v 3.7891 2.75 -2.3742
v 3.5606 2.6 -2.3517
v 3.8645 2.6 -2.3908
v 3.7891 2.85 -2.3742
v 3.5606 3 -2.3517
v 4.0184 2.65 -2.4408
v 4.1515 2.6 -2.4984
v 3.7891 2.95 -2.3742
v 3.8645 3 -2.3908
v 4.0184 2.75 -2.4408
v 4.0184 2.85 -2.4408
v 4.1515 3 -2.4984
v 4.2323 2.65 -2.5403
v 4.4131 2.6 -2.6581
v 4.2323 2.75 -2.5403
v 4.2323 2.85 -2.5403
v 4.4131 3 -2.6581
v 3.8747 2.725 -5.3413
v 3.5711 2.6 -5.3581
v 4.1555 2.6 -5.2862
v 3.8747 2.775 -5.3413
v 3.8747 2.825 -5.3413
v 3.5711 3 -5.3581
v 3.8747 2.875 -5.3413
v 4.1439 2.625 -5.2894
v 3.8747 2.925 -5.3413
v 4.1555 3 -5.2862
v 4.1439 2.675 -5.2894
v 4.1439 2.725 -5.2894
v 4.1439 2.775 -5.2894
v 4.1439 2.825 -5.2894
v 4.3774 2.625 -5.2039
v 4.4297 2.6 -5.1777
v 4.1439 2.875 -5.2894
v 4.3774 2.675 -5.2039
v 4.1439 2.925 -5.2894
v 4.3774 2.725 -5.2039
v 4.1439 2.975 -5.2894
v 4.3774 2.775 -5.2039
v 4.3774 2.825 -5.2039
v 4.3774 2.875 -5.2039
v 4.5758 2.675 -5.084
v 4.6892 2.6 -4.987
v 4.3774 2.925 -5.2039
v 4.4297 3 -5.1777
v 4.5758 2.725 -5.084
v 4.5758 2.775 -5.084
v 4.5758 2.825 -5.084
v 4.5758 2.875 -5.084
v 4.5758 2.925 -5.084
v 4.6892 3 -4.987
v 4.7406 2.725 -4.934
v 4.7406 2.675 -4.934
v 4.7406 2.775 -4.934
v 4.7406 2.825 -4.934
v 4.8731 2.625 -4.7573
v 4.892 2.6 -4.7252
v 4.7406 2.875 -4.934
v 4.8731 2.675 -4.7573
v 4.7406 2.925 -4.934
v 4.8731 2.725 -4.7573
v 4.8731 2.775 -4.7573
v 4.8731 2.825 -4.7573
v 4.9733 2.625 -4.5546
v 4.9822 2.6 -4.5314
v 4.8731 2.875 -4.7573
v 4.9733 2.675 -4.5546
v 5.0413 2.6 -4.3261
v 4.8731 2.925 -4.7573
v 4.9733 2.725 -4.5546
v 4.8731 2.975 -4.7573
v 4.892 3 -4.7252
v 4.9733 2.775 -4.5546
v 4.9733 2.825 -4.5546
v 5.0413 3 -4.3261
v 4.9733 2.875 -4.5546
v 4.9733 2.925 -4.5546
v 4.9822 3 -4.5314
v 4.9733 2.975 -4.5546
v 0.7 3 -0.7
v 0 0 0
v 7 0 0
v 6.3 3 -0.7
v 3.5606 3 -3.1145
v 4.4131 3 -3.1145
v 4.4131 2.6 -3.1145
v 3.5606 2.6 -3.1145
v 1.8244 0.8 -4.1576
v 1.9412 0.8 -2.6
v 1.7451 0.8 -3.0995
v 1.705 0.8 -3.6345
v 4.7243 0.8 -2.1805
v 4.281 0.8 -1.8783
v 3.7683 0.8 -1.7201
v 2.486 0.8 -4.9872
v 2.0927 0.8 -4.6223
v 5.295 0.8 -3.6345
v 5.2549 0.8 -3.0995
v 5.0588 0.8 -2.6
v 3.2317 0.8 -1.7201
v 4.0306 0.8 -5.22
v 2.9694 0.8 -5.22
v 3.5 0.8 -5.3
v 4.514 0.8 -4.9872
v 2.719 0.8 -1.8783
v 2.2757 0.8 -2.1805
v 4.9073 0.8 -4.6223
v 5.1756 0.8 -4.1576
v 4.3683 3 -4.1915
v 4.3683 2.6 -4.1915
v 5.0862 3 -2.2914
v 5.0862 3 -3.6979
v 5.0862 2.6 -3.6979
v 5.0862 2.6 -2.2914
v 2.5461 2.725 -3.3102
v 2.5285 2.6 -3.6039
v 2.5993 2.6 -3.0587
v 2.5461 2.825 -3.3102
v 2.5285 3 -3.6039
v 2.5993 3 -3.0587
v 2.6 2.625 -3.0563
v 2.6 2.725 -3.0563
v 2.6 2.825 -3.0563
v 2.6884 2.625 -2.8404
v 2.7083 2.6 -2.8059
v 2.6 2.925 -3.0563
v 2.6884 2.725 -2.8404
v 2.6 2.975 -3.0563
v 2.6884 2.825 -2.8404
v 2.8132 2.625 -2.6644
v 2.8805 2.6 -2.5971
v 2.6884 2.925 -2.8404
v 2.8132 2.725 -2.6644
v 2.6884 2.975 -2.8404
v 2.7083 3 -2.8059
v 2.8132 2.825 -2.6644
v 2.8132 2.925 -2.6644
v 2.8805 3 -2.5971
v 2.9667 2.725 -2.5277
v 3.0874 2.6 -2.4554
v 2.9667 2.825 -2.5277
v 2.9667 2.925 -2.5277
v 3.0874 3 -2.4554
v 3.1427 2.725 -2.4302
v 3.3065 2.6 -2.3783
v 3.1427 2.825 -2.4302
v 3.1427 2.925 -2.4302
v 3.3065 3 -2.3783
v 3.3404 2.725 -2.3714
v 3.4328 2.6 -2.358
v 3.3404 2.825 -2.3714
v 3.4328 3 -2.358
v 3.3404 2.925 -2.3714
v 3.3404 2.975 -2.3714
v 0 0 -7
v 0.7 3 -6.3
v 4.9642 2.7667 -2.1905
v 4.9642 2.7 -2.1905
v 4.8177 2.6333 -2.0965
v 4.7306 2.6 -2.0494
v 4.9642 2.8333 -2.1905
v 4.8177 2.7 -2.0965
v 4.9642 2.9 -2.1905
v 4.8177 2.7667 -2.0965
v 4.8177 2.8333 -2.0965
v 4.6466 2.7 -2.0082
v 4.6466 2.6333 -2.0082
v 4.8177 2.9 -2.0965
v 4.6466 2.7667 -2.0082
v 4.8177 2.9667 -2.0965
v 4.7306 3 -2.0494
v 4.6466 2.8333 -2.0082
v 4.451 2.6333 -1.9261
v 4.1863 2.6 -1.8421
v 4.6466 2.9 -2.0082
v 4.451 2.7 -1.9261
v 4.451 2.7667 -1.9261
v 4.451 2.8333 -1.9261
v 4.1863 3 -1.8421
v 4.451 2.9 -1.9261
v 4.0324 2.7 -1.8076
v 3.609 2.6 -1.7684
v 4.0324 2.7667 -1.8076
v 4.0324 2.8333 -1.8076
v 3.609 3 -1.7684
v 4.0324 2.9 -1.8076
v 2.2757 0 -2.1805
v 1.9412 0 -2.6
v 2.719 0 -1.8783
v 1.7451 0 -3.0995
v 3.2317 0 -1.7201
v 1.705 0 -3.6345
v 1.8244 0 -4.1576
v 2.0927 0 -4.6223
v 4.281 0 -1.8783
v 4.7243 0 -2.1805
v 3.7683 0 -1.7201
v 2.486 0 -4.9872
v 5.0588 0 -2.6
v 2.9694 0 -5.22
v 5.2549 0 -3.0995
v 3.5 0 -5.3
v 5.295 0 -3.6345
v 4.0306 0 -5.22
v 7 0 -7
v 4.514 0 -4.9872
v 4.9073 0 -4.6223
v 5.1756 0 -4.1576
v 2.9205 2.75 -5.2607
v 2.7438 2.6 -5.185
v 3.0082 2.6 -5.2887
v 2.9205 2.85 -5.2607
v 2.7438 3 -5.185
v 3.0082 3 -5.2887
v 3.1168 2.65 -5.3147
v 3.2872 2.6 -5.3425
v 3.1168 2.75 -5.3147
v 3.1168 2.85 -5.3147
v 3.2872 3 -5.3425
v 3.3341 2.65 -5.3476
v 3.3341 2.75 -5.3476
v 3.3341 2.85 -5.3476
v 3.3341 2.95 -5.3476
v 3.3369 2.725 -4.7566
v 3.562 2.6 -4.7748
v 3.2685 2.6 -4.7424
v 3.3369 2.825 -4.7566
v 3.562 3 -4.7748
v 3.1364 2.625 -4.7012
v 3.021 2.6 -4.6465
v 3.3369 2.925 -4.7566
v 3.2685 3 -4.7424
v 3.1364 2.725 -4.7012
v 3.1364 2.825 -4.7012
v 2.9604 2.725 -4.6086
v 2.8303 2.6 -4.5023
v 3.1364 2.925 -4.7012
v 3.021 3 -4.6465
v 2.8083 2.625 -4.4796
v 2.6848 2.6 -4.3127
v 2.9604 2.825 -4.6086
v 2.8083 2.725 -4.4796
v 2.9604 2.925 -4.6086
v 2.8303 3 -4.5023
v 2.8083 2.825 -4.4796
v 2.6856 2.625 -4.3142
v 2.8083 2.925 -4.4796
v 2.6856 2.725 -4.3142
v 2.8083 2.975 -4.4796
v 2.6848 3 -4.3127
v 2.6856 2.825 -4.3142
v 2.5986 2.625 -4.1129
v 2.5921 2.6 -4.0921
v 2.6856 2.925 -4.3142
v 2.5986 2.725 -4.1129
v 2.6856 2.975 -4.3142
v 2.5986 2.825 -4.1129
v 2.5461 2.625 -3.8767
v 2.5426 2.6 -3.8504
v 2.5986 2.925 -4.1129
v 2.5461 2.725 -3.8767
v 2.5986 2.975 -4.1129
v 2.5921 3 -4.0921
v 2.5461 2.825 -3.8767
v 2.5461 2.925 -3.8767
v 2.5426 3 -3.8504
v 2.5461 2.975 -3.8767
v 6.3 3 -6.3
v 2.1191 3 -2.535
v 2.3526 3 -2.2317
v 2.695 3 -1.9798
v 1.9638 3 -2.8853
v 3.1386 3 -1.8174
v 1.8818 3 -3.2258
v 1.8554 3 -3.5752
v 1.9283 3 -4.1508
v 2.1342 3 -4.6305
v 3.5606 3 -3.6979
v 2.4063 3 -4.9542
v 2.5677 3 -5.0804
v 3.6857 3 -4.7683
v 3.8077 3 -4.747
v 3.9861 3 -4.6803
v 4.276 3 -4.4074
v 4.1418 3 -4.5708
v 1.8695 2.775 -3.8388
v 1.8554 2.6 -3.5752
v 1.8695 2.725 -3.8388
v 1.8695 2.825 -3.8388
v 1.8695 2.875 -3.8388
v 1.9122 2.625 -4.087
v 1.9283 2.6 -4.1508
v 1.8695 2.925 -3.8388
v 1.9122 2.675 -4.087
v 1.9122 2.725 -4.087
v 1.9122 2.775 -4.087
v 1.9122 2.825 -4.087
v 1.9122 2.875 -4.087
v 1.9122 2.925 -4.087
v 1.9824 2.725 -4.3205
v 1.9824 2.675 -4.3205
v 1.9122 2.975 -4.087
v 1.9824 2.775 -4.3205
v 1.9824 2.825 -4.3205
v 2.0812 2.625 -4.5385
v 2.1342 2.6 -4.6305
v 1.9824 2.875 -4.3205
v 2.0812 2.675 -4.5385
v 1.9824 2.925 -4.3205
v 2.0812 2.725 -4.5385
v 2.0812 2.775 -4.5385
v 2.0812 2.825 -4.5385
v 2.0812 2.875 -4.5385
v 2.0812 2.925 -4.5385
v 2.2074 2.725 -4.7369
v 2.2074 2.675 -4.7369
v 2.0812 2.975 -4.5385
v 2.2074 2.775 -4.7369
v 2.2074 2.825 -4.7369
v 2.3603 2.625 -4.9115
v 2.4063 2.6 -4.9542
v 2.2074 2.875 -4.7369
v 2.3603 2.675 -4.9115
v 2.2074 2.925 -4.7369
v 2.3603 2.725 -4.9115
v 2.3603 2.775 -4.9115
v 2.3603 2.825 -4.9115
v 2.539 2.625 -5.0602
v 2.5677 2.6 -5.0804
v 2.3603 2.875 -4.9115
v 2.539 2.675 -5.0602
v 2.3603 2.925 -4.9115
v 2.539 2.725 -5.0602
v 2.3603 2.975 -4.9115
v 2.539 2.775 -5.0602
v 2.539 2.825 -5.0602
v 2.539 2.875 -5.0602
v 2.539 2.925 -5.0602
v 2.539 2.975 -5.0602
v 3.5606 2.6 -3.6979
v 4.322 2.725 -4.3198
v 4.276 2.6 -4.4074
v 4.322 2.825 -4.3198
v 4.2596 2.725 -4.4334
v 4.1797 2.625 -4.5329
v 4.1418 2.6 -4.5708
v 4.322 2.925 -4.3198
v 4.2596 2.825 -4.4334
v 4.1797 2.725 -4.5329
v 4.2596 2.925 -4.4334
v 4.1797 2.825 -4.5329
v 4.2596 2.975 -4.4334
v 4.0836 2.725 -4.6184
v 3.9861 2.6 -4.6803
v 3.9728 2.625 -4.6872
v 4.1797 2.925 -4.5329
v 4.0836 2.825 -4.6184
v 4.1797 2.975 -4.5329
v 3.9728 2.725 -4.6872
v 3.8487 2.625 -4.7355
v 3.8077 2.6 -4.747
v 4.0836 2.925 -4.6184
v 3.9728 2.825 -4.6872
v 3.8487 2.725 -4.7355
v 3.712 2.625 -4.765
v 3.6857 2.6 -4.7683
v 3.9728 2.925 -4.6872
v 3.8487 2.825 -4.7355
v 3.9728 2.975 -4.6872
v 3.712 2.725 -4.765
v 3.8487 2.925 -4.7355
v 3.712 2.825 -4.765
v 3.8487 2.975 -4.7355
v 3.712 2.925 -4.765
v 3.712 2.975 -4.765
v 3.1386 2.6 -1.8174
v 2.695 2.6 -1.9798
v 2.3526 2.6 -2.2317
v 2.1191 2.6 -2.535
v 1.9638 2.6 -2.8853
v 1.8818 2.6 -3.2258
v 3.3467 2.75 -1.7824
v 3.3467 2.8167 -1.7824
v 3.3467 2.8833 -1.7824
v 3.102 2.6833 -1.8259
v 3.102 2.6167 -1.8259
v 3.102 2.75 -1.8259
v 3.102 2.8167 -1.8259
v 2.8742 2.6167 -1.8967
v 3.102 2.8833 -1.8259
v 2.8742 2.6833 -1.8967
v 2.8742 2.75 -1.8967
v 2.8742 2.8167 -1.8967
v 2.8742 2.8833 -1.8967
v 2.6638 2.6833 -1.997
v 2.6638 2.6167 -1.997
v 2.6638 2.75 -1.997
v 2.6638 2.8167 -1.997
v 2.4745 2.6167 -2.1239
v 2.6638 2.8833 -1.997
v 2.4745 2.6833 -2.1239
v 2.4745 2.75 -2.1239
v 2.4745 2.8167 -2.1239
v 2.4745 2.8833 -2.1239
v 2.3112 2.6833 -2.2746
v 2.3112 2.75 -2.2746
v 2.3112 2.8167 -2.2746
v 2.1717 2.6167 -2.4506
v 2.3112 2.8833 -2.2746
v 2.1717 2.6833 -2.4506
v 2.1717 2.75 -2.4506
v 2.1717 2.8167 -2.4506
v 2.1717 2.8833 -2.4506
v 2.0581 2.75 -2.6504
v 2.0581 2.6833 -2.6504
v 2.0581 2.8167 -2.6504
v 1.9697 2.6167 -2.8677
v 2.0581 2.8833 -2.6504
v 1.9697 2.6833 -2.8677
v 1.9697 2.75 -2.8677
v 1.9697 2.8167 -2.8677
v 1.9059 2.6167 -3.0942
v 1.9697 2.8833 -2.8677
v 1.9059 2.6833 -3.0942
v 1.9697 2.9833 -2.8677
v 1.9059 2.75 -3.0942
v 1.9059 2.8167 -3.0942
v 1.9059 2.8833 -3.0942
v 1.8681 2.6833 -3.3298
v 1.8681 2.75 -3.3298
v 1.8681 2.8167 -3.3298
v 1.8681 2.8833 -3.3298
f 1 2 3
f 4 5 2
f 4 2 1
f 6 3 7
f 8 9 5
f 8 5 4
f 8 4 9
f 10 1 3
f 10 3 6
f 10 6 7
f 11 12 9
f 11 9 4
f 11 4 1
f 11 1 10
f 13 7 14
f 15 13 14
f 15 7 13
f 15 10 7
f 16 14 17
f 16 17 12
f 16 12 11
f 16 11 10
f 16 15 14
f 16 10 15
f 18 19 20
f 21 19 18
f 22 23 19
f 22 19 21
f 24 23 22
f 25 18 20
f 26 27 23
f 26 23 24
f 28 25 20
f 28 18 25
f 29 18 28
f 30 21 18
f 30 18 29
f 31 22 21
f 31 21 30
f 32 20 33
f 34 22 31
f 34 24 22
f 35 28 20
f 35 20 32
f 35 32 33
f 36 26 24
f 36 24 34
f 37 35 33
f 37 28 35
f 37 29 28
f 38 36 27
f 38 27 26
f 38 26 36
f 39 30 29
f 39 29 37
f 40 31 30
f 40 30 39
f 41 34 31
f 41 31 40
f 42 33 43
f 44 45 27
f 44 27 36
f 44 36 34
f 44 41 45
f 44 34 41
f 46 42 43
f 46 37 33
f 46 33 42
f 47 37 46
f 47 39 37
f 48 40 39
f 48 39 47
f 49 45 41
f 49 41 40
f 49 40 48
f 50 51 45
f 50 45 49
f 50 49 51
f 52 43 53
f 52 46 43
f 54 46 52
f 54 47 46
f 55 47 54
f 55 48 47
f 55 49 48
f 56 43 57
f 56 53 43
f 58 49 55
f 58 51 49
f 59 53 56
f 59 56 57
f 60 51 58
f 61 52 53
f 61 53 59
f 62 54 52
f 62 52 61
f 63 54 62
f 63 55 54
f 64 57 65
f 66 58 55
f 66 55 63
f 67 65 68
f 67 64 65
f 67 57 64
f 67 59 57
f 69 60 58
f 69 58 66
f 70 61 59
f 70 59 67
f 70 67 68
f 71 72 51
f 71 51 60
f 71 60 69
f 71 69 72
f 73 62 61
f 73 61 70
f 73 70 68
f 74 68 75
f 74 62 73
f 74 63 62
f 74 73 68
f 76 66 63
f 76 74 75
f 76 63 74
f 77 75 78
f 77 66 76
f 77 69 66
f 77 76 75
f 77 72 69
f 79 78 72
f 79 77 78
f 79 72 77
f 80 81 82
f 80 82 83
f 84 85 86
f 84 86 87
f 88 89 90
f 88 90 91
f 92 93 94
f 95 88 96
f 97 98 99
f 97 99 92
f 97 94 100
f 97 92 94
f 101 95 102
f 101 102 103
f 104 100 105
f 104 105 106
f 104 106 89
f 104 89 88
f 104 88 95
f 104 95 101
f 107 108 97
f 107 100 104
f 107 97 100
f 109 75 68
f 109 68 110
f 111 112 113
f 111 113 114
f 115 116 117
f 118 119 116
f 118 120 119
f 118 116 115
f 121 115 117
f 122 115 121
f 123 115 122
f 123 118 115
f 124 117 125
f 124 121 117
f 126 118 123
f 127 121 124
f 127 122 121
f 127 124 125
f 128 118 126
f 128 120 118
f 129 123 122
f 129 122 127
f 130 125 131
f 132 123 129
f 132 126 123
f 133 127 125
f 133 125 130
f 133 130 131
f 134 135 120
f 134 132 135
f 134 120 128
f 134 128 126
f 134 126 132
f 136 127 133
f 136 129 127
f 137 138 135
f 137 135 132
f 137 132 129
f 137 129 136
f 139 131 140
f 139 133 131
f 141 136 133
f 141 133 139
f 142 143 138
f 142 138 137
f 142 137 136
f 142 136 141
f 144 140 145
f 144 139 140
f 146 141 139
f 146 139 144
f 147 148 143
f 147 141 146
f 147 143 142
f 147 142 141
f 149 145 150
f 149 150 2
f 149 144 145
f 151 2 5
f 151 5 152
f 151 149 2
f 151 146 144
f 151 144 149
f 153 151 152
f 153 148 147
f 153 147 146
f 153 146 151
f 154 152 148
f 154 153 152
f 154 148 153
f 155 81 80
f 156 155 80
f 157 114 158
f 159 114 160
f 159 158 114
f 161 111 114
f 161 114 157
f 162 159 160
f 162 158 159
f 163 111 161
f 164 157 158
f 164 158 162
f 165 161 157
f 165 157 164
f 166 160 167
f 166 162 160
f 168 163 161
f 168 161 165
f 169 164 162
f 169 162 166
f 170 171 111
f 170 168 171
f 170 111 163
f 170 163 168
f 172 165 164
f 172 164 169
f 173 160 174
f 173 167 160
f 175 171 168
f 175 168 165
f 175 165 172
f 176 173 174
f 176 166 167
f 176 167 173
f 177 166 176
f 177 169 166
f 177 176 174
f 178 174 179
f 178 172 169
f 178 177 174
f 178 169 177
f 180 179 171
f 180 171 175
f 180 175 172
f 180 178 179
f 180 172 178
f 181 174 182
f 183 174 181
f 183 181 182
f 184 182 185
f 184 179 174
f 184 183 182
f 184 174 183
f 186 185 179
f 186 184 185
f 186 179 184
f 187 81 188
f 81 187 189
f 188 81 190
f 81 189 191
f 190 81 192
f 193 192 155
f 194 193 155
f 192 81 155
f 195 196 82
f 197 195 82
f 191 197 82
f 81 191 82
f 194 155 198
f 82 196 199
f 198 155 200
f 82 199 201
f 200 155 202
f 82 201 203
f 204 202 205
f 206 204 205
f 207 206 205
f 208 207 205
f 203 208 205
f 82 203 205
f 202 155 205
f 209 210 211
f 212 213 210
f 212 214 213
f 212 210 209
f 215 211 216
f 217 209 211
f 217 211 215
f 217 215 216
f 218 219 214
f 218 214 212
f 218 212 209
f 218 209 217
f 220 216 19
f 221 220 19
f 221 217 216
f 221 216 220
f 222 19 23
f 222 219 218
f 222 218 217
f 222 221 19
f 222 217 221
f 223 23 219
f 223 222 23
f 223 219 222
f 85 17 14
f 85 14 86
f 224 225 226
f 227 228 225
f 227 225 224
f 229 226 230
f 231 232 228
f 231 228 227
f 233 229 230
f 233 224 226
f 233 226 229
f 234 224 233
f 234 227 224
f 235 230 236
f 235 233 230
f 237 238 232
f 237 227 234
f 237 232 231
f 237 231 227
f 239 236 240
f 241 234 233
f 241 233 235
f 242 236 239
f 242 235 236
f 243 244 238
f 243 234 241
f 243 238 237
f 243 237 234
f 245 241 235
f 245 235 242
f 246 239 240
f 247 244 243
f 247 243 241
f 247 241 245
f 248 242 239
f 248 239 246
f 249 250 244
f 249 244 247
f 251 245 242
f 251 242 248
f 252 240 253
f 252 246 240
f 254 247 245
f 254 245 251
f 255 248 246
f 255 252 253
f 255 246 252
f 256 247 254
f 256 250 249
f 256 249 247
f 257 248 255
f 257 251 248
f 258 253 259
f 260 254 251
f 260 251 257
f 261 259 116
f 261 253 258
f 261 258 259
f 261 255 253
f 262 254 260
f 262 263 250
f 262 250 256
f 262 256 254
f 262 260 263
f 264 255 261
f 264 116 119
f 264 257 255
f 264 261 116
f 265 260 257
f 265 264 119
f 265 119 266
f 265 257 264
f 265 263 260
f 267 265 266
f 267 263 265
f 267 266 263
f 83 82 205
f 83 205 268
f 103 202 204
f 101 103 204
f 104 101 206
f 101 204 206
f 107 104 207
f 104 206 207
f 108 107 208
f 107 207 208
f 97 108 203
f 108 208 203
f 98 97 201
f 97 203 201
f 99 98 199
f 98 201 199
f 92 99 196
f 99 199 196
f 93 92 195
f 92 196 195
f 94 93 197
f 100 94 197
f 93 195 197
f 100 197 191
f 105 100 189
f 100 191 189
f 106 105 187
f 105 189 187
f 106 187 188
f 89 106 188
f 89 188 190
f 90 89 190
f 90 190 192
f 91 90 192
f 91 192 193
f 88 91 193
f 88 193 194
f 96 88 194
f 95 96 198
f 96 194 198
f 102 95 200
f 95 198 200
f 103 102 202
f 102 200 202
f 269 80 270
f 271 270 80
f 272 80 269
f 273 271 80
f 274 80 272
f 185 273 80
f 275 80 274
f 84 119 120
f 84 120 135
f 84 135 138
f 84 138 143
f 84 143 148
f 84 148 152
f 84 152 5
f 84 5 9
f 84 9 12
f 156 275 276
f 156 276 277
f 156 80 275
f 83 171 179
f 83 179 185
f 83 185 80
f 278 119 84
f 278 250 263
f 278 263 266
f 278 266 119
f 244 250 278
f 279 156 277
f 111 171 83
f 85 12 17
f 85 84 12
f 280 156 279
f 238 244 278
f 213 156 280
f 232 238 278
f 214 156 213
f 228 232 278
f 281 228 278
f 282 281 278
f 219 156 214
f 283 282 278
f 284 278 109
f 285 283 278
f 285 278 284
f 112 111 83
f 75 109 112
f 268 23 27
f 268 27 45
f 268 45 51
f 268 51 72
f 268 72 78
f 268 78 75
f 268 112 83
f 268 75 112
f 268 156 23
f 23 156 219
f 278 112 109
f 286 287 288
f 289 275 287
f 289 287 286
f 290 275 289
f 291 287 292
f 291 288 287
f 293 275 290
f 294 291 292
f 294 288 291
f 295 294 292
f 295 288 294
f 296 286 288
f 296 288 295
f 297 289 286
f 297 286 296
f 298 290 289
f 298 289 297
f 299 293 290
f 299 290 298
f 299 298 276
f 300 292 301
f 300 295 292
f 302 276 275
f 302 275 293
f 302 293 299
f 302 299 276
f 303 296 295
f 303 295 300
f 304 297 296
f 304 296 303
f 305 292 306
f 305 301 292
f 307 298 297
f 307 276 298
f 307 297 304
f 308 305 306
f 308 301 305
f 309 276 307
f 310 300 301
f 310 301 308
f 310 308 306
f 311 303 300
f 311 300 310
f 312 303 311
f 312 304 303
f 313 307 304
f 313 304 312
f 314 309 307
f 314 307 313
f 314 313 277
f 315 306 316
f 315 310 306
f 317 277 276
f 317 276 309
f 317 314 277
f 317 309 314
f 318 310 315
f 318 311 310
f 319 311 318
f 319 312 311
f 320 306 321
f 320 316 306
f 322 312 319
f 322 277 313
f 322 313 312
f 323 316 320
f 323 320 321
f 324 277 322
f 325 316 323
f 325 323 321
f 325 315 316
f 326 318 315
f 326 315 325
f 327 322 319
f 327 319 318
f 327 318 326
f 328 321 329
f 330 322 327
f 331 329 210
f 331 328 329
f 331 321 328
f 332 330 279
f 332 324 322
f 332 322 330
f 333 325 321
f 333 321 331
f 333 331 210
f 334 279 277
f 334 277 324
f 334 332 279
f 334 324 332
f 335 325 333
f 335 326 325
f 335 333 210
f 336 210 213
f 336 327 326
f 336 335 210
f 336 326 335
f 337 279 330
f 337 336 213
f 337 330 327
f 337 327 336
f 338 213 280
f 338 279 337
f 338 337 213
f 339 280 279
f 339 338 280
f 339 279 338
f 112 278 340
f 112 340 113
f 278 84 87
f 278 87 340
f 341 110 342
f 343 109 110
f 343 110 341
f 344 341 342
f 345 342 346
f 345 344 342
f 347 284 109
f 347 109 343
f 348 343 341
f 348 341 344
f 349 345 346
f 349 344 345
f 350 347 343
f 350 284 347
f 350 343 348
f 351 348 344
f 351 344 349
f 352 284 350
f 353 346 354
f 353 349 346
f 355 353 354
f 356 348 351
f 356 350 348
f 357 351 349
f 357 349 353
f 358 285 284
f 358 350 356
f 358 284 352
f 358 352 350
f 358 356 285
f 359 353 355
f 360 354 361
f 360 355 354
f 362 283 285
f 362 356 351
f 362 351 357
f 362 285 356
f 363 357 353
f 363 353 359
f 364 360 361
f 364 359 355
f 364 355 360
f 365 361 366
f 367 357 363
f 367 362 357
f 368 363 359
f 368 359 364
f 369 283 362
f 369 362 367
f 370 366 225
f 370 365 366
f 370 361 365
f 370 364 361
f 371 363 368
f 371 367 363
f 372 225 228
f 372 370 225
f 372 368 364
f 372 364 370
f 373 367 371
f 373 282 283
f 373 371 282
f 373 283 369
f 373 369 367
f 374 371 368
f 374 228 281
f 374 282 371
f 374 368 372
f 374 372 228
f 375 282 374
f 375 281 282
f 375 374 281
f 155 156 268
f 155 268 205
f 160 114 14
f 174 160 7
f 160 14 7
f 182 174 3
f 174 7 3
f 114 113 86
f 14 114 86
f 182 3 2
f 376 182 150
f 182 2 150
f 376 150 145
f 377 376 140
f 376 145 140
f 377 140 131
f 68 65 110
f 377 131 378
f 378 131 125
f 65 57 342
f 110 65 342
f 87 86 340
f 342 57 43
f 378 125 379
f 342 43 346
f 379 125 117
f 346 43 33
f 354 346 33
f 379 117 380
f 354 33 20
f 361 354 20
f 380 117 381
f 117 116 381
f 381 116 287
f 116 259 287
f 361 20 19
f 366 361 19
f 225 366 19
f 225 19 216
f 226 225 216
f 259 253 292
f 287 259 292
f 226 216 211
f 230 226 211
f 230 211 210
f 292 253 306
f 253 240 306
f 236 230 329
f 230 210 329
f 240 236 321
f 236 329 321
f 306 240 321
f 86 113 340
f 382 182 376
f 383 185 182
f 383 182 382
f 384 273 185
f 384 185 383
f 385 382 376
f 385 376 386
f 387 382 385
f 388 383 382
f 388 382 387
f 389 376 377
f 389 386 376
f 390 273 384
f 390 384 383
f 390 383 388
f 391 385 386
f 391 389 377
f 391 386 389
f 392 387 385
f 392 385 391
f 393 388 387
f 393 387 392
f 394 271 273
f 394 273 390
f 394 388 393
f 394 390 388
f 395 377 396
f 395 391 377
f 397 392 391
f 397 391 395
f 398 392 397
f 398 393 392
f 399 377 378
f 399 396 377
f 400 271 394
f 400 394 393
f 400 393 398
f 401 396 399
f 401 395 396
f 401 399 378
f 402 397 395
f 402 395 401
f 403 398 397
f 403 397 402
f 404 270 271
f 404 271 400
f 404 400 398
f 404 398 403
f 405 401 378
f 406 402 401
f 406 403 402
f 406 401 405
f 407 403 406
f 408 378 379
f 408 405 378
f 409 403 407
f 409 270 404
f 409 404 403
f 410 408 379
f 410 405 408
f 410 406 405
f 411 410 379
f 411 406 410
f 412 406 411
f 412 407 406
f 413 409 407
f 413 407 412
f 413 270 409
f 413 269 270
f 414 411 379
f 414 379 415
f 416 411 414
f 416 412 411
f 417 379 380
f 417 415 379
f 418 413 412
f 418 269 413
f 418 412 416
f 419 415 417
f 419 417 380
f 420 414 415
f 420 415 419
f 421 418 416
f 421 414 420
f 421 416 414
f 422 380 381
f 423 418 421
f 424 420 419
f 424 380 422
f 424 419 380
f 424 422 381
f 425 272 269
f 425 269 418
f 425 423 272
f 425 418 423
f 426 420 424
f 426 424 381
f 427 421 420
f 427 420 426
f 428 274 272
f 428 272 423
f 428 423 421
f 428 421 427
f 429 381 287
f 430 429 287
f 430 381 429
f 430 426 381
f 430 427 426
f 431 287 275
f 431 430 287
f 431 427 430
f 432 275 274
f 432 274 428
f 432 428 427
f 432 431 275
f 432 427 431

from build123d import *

# Parameters (mm, degrees)
SKETCH1_W           = 7
SKETCH1_H           = 7
BOSS_EXTRUDE1_DEPTH = 3
CUT_EXTRUDE1_DEPTH  = 7
CUT_EXTRUDE2_DEPTH  = 11
SKETCH4_R           = 1.8
CUT_EXTRUDE3_DEPTH  = 0.8
CUT_EXTRUDE4_DEPTH  = 0.4


with BuildPart() as part:
    # Sketch1 → Boss-Extrude1 (new body)
    with BuildSketch(Plane(origin=(0, 0, 0), x_dir=(1, 0, 0), z_dir=(0, 1, 0))):
        with Locations((3.5, 3.5)):
            Rectangle(SKETCH1_W, SKETCH1_H)
    extrude(amount=BOSS_EXTRUDE1_DEPTH)

    # Sketch2 → Cut-Extrude1 (cut)
    with BuildSketch(Plane.XY):
        Polygon((0, 0), (0.7, 3), (0, 3), align=None)
        Polygon((7, 0), (6.3, 3), (7, 3), align=None)
    extrude(amount=-CUT_EXTRUDE1_DEPTH, mode=Mode.SUBTRACT)

    # Sketch3 → Cut-Extrude2 (cut)
    with BuildSketch(Plane(origin=(0, 0, 0), x_dir=(0, 0, -1), z_dir=(1, 0, 0))):
        Polygon((0, 0), (0.7, 3), (0, 3), align=None)
        Polygon((7, 3), (6.3, 3), (7, 0), align=None)
    extrude(amount=CUT_EXTRUDE2_DEPTH, mode=Mode.SUBTRACT)

    # Sketch4 → Cut-Extrude3 (cut)
    with BuildSketch(Plane.XZ):
        with Locations(Location((3.5, -3.5, 0), (0, 0, 270))):
            Circle(SKETCH4_R)
    extrude(amount=-CUT_EXTRUDE3_DEPTH, mode=Mode.SUBTRACT)

    # Sketch5 → Cut-Extrude4 (cut)
    with BuildSketch(Plane(origin=(0, 3, 0), x_dir=(1, 0, 0), z_dir=(0, 1, 0))):
        with BuildLine():
            Line((3.560577146, 3.114540144), (3.560577146, 3.697873477))
            Line((3.560577146, 3.697873477), (5.086218172, 3.697873477))
            Line((5.086218172, 3.697873477), (5.086218172, 2.291423157))
            add(Edge.make_bspline(
                [(5.086218172, 2.291423157), (5.067017117, 2.274133072), (5.027766277, 2.238788642), (4.963724103, 2.188944154), (4.893219701, 2.141357686), (4.816679286, 2.095065493), (4.733944457, 2.050440158), (4.645345204, 2.006860163), (4.550718059, 1.964751709), (4.416901441, 1.91200226), (4.244652022, 1.854606501), (4.034073664, 1.804699023), (3.821829494, 1.774088797), (3.679866665, 1.770285893), (3.60895455, 1.768386298)],
                knots=[0, 0, 0, 0, 0.581799769, 1.189316438, 1.825828404, 2.496525428, 3.203088405, 3.942228803, 4.719818701, 5.534979611, 7.181138583, 8.803804008, 10.403462225, 12, 12, 12, 12], degree=3))
            add(Edge.make_bspline(
                [(3.60895455, 1.768386298), (3.564530426, 1.769053863), (3.476957263, 1.770369833), (3.347679322, 1.780962016), (3.222873793, 1.79908519), (3.10243897, 1.824748474), (2.985967191, 1.855684985), (2.87394395, 1.895149291), (2.766766964, 1.94252304), (2.663465207, 1.995311299), (2.565964473, 2.055942911), (2.474170574, 2.122268485), (2.388747899, 2.194864928), (2.310002684, 2.273878576), (2.236880415, 2.358765244), (2.170234263, 2.449929726), (2.110467262, 2.547477268), (2.056841671, 2.650184243), (2.009134136, 2.757147371), (1.968877334, 2.867524799), (1.933584129, 2.979713967), (1.904576972, 3.094108746), (1.883272633, 3.211081052), (1.866711077, 3.330089662), (1.857815915, 3.451878149), (1.85624329, 3.533798405), (1.855448941, 3.575177163)],
                knots=[0, 0, 0, 0, 1.124918047, 2.217548049, 3.282233239, 4.316494221, 5.334437038, 6.332151046, 7.320712088, 8.300141923, 9.267552434, 10.225301062, 11.165776911, 12.103230934, 13.047553934, 14.000517593, 14.959782875, 15.941944936, 16.932894943, 17.923491392, 18.915624898, 19.910402922, 20.909870877, 21.92519501, 22.95199481, 24, 24, 24, 24], degree=3))
            add(Edge.make_bspline(
                [(1.855448941, 3.575177163), (1.856093148, 3.619838006), (1.857363158, 3.70788383), (1.868308868, 3.838014535), (1.885306261, 3.964331927), (1.911081696, 4.086606684), (1.942440107, 4.205407986), (1.980711267, 4.320657597), (2.027601885, 4.431501631), (2.079763432, 4.538888047), (2.139142377, 4.641331803), (2.206237244, 4.73751889), (2.279062516, 4.828419459), (2.359057277, 4.912589631), (2.445939825, 4.989988393), (2.538826953, 5.06147172), (2.637496219, 5.128271897), (2.70811648, 5.165936981), (2.743770255, 5.184952804)],
                knots=[0, 0, 0, 0, 1.105010302, 2.178452875, 3.229459892, 4.257086284, 5.268538906, 6.268935615, 7.259234261, 8.24469117, 9.221745683, 10.185929258, 11.144249683, 12.101504986, 13.055838221, 14.020611351, 15.000673771, 16, 16, 16, 16], degree=3))
            add(Edge.make_bspline(
                [(2.743770255, 5.184952804), (2.772065201, 5.199002298), (2.829534559, 5.227537973), (2.920968547, 5.261607564), (3.016595835, 5.292607583), (3.117860188, 5.315737399), (3.224073939, 5.33474033), (3.335190018, 5.348921508), (3.4515659, 5.356368591), (3.530653011, 5.357533973), (3.571093973, 5.358129887)],
                knots=[0, 0, 0, 0, 0.887969848, 1.803539625, 2.741143579, 3.713741423, 4.722068772, 5.775476617, 6.8624965, 8, 8, 8, 8], degree=3))
            add(Edge.make_bspline(
                [(3.571093973, 5.358129887), (3.623235223, 5.357353239), (3.724640313, 5.3558428), (3.872481342, 5.343256962), (4.011619071, 5.321565683), (4.142247257, 5.29169089), (4.264084488, 5.253279835), (4.376921023, 5.206058081), (4.481449427, 5.150975954), (4.576155731, 5.085825914), (4.662964716, 5.013990372), (4.741649855, 4.935381948), (4.81224282, 4.849884207), (4.874790314, 4.75792735), (4.928800044, 4.659131282), (4.975238097, 4.554397044), (5.013462237, 4.442929528), (5.031935116, 4.365517314), (5.041346377, 4.326078605)],
                knots=[0, 0, 0, 0, 1.271135529, 2.472123572, 3.614091059, 4.701890498, 5.736279567, 6.724681829, 7.680621489, 8.611506429, 9.52200816, 10.424540711, 11.318996785, 12.221421405, 13.131851814, 14.060431888, 15.011860567, 16, 16, 16, 16], degree=3))
            Line((5.041346377, 4.326078605), (4.368269454, 4.191463221))
            add(Edge.make_bspline(
                [(4.368269454, 4.191463221), (4.361604715, 4.213549965), (4.348455309, 4.257126698), (4.322964325, 4.319678226), (4.293604309, 4.3784808), (4.260304833, 4.433960038), (4.222730432, 4.485774386), (4.179973312, 4.533364921), (4.134723148, 4.57890244), (4.084024684, 4.619217322), (4.029984173, 4.655561005), (3.973210536, 4.688333605), (3.91242093, 4.71491127), (3.848466862, 4.736295893), (3.781660913, 4.75445708), (3.71113124, 4.76562628), (3.637669879, 4.774050015), (3.58747979, 4.774545043), (3.56197939, 4.774796554)],
                knots=[0, 0, 0, 0, 1.027736275, 2.027704492, 3.005900071, 3.954421694, 4.908588141, 5.853155543, 6.803277083, 7.766271258, 8.734041521, 9.704274878, 10.683578894, 11.68490234, 12.708089448, 13.76461009, 14.864251086, 16, 16, 16, 16], degree=3))
            add(Edge.make_bspline(
                [(3.56197939, 4.774796554), (3.523383641, 4.773766807), (3.448060748, 4.771757168), (3.338099362, 4.758643838), (3.234360883, 4.735314023), (3.13657404, 4.70313499), (3.044559561, 4.661830949), (2.959560848, 4.609861345), (2.879461483, 4.550301297), (2.806540814, 4.480398046), (2.740410053, 4.402016529), (2.68316205, 4.31422182), (2.635503332, 4.217297709), (2.596468126, 4.11173088), (2.565387773, 3.997516933), (2.544303255, 3.874251546), (2.530527014, 3.742123824), (2.529206604, 3.650935474), (2.528525864, 3.603923157)],
                knots=[0, 0, 0, 0, 1.043810997, 2.037086103, 2.989314757, 3.91471467, 4.817033861, 5.710208705, 6.603920097, 7.511448416, 8.435617211, 9.371747005, 10.338444094, 11.350425613, 12.411431869, 13.5347293, 14.729025275, 16, 16, 16, 16], degree=3))
            add(Edge.make_bspline(
                [(2.528525864, 3.603923157), (2.529235737, 3.553411684), (2.530615417, 3.455239689), (2.544030551, 3.312994813), (2.566098564, 3.1804679), (2.597751337, 3.057826113), (2.637580383, 2.944634337), (2.685456676, 2.840530978), (2.744541809, 2.747447788), (2.811096159, 2.66351894), (2.885483615, 2.590182439), (2.965618207, 2.526245677), (3.051053791, 2.472061589), (3.142578213, 2.428485457), (3.239037142, 2.393797733), (3.341317359, 2.36947923), (3.449114318, 2.354373472), (3.522899335, 2.352616709), (3.560577146, 2.351719631)],
                knots=[0, 0, 0, 0, 1.318042826, 2.561693173, 3.724929596, 4.821196409, 5.862977565, 6.853497791, 7.804600806, 8.73339865, 9.643480846, 10.524649628, 11.404635349, 12.277659519, 13.165160235, 14.075017549, 15.017020959, 16, 16, 16, 16], degree=3))
            add(Edge.make_bspline(
                [(3.560577146, 2.351719631), (3.598739169, 2.352780416), (3.675428288, 2.354912133), (3.790294349, 2.372976278), (3.905609834, 2.399558249), (4.018668414, 2.439657646), (4.128467307, 2.485651373), (4.2309763, 2.53865833), (4.326972813, 2.593911136), (4.384773897, 2.636975114), (4.413141249, 2.658109855)],
                knots=[0, 0, 0, 0, 0.993821502, 1.997150276, 3.023717651, 4.073291794, 5.118404464, 6.123376694, 7.078999408, 8, 8, 8, 8], degree=3))
            Line((4.413141249, 2.658109855), (4.413141249, 3.114540144))
            Line((4.413141249, 3.114540144), (3.560577146, 3.114540144))
        make_face()
    extrude(amount=-CUT_EXTRUDE4_DEPTH, mode=Mode.SUBTRACT)


solid = part.part
